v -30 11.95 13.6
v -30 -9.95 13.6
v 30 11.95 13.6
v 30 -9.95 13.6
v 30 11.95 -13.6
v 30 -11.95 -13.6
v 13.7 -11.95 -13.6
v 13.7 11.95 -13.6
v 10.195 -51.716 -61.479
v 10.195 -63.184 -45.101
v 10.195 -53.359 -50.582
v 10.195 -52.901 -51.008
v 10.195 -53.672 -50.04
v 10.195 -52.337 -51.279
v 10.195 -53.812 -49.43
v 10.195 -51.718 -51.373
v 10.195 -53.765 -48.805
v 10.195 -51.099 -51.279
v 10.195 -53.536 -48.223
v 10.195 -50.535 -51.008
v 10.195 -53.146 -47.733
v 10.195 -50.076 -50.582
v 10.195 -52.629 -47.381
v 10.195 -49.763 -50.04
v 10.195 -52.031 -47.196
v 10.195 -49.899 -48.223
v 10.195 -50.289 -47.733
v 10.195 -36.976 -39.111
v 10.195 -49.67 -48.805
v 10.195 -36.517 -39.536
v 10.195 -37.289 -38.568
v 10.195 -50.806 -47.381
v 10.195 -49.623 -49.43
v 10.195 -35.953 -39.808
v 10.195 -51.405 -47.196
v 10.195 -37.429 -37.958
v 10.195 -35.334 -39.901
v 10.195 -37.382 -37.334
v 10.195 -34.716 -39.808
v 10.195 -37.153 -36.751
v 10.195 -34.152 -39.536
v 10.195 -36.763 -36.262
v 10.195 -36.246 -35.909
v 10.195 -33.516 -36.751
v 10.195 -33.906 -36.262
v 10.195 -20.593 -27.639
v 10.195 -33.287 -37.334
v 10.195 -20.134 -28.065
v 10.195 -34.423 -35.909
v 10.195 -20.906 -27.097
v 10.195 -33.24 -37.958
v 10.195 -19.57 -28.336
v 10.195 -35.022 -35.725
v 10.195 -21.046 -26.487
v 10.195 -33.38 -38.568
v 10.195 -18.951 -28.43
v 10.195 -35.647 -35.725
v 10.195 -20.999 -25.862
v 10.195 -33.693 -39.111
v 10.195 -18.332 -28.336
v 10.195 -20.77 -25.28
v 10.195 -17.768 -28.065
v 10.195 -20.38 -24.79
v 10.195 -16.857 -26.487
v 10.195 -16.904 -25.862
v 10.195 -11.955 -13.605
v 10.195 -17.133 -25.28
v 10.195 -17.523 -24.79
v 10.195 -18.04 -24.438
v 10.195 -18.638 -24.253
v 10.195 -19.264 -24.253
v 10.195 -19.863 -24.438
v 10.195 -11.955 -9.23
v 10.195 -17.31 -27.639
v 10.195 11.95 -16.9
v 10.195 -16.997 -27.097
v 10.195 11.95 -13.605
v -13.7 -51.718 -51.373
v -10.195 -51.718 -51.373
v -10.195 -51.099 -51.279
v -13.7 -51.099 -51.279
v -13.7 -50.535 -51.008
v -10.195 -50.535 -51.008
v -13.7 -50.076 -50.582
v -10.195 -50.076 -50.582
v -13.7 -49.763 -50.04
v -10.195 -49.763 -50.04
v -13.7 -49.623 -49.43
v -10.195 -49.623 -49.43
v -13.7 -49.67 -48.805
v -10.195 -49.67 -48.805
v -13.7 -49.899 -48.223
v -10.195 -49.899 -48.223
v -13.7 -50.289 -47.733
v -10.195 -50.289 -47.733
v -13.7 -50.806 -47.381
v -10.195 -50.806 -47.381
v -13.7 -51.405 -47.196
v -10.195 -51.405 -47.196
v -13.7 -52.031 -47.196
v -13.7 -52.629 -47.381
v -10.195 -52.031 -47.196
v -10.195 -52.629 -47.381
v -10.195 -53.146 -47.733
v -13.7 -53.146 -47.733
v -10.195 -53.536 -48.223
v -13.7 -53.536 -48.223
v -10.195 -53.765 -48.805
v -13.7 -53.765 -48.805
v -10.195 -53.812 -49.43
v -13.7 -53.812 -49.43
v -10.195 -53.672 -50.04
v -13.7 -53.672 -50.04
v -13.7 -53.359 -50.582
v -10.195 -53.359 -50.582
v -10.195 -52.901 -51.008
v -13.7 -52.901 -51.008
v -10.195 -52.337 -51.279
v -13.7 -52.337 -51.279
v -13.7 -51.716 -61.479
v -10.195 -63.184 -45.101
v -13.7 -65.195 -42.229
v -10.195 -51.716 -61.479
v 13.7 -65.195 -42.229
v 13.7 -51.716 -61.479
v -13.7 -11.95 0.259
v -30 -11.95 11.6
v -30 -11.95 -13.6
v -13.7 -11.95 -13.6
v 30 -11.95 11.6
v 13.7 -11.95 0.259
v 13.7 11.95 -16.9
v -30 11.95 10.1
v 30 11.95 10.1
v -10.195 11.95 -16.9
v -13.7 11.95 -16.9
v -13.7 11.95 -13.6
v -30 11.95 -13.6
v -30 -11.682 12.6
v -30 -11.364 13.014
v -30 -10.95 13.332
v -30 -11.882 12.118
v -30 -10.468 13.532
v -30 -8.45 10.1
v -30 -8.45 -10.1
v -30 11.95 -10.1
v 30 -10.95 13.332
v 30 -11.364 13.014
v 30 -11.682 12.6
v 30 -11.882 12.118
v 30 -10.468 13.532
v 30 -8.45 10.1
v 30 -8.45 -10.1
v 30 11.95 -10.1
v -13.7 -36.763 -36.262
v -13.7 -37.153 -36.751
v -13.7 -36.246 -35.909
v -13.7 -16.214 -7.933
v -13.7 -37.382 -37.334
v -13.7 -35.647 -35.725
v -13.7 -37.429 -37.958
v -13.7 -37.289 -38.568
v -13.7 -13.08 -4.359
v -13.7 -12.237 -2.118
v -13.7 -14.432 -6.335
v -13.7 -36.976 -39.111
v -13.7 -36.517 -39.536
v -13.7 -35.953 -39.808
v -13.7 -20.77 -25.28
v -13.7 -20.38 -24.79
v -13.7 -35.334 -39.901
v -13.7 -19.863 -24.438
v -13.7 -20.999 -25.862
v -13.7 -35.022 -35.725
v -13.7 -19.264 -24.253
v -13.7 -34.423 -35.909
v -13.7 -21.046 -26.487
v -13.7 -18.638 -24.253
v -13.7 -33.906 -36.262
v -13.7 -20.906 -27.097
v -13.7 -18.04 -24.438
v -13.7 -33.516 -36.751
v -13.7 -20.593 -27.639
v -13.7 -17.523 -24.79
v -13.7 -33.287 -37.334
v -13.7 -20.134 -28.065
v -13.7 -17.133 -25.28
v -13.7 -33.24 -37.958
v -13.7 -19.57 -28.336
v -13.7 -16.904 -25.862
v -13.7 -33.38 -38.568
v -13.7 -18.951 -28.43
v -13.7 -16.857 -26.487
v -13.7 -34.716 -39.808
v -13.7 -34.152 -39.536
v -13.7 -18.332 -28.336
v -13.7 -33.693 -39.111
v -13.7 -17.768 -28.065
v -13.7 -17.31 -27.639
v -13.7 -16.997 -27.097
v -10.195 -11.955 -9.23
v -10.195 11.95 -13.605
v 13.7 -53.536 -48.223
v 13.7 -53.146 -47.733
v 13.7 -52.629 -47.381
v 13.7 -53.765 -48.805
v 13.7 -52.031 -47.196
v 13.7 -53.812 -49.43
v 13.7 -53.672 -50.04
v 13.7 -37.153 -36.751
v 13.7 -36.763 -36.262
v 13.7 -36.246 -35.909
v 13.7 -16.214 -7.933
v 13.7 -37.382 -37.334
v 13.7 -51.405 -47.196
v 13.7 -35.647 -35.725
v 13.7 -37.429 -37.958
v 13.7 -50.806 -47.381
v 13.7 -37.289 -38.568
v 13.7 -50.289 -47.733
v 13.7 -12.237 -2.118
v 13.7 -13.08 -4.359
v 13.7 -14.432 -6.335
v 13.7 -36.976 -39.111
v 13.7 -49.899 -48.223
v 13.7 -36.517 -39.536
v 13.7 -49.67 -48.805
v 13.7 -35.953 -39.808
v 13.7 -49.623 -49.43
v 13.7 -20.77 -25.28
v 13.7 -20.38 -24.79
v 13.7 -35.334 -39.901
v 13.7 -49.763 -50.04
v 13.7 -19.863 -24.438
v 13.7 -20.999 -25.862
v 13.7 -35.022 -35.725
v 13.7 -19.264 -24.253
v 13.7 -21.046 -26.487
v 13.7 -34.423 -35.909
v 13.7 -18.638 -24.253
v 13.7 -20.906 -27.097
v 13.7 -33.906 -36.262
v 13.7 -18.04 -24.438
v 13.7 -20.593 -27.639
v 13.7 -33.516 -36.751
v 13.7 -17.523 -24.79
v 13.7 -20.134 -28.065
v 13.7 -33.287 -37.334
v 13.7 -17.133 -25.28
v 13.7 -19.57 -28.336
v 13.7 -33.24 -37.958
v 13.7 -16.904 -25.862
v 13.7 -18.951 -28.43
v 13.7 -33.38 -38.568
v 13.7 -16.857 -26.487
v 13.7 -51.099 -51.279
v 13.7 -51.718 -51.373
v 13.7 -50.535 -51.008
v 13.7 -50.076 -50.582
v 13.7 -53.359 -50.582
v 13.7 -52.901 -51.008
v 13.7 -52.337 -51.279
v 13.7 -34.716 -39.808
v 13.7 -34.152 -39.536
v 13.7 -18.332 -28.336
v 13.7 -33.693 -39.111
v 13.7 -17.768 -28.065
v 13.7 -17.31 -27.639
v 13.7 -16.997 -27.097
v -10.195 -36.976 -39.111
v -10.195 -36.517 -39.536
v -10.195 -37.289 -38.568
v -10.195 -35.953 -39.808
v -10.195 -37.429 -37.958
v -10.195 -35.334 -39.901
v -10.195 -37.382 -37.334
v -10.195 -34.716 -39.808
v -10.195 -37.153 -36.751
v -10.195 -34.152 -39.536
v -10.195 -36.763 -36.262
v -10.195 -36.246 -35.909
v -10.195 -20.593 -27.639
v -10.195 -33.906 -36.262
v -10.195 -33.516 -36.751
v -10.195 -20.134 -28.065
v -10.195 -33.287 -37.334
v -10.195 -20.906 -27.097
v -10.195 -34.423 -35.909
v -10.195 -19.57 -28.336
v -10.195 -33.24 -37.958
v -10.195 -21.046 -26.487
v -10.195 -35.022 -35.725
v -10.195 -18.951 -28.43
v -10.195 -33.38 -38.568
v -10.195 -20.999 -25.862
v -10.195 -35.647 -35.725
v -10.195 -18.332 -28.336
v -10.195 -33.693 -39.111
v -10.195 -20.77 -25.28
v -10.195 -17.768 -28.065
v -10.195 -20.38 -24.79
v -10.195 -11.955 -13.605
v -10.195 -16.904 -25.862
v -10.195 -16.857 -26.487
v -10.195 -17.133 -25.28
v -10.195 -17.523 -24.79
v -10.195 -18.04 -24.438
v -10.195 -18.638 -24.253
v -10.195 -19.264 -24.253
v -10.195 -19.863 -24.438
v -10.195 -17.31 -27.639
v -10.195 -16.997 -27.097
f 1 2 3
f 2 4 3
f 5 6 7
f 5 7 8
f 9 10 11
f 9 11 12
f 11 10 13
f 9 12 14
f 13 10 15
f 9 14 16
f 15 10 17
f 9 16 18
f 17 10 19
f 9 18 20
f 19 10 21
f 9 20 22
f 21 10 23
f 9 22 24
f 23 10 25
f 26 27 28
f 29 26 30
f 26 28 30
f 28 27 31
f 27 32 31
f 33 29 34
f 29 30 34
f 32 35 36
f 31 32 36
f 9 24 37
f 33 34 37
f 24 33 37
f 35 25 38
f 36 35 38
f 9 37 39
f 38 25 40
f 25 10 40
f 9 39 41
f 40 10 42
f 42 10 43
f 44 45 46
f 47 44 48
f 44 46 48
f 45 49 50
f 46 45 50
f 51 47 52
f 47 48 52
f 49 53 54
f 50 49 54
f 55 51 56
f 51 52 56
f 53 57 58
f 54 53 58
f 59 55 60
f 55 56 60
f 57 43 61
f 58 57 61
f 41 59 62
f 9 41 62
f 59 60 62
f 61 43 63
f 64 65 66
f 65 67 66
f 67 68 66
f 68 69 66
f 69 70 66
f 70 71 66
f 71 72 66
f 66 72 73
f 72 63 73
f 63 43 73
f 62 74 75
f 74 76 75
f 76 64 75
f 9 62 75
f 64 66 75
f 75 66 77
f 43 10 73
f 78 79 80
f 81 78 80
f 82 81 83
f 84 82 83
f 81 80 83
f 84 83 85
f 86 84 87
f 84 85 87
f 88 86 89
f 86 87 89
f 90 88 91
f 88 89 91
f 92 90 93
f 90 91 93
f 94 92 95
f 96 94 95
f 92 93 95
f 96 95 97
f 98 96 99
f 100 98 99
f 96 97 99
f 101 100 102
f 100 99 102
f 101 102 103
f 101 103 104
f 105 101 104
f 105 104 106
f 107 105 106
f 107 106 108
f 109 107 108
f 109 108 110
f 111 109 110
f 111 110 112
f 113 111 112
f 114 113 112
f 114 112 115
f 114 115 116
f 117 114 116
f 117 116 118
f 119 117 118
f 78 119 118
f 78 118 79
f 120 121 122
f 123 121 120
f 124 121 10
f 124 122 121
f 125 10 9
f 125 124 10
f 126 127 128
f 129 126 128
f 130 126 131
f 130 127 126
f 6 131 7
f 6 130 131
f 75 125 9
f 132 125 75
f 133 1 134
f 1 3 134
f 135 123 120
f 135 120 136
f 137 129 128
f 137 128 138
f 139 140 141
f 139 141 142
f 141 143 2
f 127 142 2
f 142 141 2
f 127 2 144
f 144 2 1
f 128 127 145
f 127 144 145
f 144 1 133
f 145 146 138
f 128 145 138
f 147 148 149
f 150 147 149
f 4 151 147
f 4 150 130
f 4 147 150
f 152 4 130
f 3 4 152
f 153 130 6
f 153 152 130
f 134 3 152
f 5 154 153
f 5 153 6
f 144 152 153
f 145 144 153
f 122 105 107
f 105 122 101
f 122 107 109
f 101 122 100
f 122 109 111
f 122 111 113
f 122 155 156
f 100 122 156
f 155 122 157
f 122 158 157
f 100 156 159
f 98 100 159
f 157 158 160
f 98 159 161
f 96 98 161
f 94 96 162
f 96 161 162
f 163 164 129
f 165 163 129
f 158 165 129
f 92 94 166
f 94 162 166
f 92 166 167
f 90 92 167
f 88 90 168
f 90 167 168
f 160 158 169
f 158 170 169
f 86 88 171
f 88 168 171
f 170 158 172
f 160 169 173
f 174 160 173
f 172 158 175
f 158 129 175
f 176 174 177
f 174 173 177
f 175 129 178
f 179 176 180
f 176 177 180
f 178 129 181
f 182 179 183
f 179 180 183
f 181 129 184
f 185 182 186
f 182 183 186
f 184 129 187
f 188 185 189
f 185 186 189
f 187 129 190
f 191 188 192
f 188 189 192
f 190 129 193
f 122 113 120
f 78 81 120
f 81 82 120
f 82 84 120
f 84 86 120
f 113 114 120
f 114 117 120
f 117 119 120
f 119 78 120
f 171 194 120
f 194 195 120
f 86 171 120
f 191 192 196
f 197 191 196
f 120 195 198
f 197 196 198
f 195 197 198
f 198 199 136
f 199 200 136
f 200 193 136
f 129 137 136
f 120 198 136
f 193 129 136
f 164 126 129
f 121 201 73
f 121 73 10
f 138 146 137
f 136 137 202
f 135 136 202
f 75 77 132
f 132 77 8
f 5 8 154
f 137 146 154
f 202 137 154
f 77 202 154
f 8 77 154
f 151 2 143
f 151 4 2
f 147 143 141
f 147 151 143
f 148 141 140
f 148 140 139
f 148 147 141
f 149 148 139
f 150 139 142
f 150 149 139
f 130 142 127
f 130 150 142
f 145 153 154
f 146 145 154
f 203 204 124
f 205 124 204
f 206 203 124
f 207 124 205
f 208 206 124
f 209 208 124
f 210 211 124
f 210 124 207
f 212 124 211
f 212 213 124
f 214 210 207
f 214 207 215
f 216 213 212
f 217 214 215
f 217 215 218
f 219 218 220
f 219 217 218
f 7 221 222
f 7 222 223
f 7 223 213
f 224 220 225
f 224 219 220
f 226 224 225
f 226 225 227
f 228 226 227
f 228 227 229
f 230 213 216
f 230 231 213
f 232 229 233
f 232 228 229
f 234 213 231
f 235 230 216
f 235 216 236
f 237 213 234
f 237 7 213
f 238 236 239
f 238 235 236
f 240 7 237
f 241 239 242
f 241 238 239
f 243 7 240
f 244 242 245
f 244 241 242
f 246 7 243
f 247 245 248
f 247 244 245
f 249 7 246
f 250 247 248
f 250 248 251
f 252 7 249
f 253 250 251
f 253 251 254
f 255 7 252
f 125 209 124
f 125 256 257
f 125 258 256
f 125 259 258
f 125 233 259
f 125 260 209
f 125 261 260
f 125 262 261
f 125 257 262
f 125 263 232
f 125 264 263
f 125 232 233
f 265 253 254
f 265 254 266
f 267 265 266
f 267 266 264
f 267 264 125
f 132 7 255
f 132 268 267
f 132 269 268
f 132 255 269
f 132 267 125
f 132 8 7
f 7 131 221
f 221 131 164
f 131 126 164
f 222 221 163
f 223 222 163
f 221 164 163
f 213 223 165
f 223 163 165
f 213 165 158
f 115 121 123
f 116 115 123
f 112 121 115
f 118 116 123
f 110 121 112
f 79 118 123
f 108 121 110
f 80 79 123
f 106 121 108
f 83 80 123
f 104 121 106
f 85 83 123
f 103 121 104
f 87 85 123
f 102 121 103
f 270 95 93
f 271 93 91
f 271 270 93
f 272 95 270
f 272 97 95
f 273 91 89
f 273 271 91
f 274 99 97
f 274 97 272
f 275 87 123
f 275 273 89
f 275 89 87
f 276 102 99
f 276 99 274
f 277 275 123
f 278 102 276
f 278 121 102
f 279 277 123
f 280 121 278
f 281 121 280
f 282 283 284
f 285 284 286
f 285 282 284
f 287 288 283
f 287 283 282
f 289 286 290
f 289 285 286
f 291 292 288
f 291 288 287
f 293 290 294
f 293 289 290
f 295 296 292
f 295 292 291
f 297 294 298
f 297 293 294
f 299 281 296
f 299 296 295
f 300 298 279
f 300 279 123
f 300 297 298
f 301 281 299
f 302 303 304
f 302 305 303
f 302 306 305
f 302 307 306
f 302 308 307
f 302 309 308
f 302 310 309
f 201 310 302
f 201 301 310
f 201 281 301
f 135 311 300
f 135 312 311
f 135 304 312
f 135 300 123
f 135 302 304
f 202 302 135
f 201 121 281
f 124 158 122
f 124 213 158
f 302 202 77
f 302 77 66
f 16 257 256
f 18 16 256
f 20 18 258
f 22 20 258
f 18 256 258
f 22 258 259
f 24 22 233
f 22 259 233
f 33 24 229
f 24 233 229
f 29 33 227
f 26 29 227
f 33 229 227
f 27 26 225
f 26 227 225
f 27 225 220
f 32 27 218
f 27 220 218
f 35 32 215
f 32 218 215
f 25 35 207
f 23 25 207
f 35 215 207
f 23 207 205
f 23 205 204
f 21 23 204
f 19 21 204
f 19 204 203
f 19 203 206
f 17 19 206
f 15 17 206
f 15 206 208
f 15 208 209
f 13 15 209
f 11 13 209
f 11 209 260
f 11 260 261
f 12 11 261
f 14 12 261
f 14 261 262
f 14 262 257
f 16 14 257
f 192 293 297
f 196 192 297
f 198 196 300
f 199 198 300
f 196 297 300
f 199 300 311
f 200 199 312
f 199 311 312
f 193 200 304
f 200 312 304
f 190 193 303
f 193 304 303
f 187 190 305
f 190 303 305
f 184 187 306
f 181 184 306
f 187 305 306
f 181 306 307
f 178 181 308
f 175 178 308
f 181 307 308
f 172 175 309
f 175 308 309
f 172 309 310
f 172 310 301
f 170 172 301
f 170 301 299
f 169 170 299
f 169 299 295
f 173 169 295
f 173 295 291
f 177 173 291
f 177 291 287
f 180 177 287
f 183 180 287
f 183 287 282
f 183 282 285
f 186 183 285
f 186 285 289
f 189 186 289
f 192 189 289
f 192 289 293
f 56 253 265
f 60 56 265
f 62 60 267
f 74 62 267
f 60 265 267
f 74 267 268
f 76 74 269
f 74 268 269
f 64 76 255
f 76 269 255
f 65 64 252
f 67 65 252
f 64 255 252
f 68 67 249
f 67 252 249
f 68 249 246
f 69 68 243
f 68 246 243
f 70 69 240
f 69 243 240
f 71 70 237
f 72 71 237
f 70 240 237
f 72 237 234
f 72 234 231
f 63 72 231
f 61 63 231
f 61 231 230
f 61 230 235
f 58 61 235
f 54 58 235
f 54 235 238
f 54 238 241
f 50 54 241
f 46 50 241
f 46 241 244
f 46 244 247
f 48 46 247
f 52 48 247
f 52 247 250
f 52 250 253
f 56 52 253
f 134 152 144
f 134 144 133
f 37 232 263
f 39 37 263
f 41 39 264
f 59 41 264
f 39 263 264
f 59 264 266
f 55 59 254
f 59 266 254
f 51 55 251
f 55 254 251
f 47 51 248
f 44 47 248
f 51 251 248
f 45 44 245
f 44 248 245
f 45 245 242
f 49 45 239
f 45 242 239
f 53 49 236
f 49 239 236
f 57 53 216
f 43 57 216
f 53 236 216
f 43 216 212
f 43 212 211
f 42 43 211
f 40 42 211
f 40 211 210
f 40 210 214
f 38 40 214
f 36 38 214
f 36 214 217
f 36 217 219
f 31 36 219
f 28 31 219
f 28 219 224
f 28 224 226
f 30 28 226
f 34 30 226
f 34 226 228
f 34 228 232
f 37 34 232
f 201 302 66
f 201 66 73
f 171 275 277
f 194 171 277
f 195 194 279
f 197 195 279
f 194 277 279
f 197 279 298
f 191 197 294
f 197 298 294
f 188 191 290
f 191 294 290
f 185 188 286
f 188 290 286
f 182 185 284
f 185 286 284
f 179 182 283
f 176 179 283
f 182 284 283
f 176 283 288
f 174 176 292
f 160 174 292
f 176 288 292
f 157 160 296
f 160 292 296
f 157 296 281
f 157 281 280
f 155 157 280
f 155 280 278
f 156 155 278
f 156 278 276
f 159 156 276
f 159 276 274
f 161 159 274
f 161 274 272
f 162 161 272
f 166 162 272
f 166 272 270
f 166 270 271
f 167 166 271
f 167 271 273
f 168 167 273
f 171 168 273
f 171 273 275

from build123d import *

# Parameters (mm, degrees)
SKETCH1_W           = 27.2
SKETCH1_H           = 23.9
BOSS_EXTRUDE1_DEPTH = 30
SHELL1_T            = -3.5
BOSS_EXTRUDE2_DEPTH = 13.7
SHELL3_START        = -10.194612797
SHELL3_DEPTH        = 20.389225594
FILLET2_R           = 2
SKETCH3_R           = 2.1
CUT_EXTRUDE1_DEPTH  = 100.698379758
FILLET3_R           = 10
SKETCH4_W           = 27.4
SKETCH4_H           = 4.712888426
CUT_EXTRUDE2_DEPTH  = 89.262138497


# Read off the part's stored shape, not the designer's step: Shell3
with BuildPart() as part:
    # Sketch1 → Boss-Extrude1 (new, symmetric)
    with BuildSketch(Plane(origin=(0, 0, 0), x_dir=(0, 0, -1), z_dir=(1, 0, 0))):
        Rectangle(SKETCH1_W, SKETCH1_H)
    extrude(amount=BOSS_EXTRUDE1_DEPTH, both=True)

    # Shell1
    shell1_openings = [part.faces().sort_by_distance(p)[0] for p in [
        (30, 0, 0),
        (-30, 0, 0),
        (0, 11.95, 0),
    ]]
    offset(amount=SHELL1_T, openings=shell1_openings, kind=Kind.INTERSECTION)

    # Sketch2 → Boss-Extrude2 (add, symmetric)
    with BuildSketch(Plane(origin=(0, 0, 0), x_dir=(0, 0, -1), z_dir=(1, 0, 0))):
        Polygon((4.94675733, -11.95), (42.229225693, -65.194882879), (61.479298734, -51.715836625), (13.6, 16.662888426), (10.1, 16.662888426), (10.1, 11.95), (13.6, 11.95), (13.6, -11.95), align=None)
    extrude(amount=BOSS_EXTRUDE2_DEPTH, both=True)

    # Shell3 outline → Shell3 (cut)
    with BuildSketch(Plane.YZ.offset(SHELL3_START)):
        Polygon((13.157501223, -16.054498544), (13.157501223, -13.605387203), (-11.955387203, -13.605387203), (-11.955387203, -9.229817112), (-63.184275379, -45.100670786), (-51.715836625, -61.479298734), align=None)
    extrude(amount=SHELL3_DEPTH, mode=Mode.SUBTRACT)

    # Fillet2
    fillet2_edges = [part.edges().sort_by_distance(p)[0] for p in [
        (0, -11.95, 13.6),
    ]]
    fillet(fillet2_edges, radius=FILLET2_R)

    # Sketch3 → Cut-Extrude1 (cut, through all)
    with BuildSketch(Plane(origin=(13.7, 0, 0), x_dir=(0, 0, -1), z_dir=(1, 0, 0))):
        with Locations((49.272743236, -51.717536678)):
            Circle(SKETCH3_R)
        with Locations((37.801214509, -35.334495792)):
            Circle(SKETCH3_R)
        with Locations((26.329685782, -18.951454906)):
            Circle(SKETCH3_R)
    extrude(amount=-CUT_EXTRUDE1_DEPTH, mode=Mode.SUBTRACT)

    # Fillet3
    fillet3_edges = [part.edges().sort_by_distance(p)[0] for p in [
        (0, -11.95, -4.94675733),
    ]]
    fillet(fillet3_edges, radius=FILLET3_R)

    # Sketch4 → Cut-Extrude2 (cut, through all)
    with BuildSketch(Plane.XY.offset(-10.1)):
        with Locations((0, 14.306444213)):
            Rectangle(SKETCH4_W, SKETCH4_H)
    extrude(amount=-CUT_EXTRUDE2_DEPTH, mode=Mode.SUBTRACT)


solid = part.part
